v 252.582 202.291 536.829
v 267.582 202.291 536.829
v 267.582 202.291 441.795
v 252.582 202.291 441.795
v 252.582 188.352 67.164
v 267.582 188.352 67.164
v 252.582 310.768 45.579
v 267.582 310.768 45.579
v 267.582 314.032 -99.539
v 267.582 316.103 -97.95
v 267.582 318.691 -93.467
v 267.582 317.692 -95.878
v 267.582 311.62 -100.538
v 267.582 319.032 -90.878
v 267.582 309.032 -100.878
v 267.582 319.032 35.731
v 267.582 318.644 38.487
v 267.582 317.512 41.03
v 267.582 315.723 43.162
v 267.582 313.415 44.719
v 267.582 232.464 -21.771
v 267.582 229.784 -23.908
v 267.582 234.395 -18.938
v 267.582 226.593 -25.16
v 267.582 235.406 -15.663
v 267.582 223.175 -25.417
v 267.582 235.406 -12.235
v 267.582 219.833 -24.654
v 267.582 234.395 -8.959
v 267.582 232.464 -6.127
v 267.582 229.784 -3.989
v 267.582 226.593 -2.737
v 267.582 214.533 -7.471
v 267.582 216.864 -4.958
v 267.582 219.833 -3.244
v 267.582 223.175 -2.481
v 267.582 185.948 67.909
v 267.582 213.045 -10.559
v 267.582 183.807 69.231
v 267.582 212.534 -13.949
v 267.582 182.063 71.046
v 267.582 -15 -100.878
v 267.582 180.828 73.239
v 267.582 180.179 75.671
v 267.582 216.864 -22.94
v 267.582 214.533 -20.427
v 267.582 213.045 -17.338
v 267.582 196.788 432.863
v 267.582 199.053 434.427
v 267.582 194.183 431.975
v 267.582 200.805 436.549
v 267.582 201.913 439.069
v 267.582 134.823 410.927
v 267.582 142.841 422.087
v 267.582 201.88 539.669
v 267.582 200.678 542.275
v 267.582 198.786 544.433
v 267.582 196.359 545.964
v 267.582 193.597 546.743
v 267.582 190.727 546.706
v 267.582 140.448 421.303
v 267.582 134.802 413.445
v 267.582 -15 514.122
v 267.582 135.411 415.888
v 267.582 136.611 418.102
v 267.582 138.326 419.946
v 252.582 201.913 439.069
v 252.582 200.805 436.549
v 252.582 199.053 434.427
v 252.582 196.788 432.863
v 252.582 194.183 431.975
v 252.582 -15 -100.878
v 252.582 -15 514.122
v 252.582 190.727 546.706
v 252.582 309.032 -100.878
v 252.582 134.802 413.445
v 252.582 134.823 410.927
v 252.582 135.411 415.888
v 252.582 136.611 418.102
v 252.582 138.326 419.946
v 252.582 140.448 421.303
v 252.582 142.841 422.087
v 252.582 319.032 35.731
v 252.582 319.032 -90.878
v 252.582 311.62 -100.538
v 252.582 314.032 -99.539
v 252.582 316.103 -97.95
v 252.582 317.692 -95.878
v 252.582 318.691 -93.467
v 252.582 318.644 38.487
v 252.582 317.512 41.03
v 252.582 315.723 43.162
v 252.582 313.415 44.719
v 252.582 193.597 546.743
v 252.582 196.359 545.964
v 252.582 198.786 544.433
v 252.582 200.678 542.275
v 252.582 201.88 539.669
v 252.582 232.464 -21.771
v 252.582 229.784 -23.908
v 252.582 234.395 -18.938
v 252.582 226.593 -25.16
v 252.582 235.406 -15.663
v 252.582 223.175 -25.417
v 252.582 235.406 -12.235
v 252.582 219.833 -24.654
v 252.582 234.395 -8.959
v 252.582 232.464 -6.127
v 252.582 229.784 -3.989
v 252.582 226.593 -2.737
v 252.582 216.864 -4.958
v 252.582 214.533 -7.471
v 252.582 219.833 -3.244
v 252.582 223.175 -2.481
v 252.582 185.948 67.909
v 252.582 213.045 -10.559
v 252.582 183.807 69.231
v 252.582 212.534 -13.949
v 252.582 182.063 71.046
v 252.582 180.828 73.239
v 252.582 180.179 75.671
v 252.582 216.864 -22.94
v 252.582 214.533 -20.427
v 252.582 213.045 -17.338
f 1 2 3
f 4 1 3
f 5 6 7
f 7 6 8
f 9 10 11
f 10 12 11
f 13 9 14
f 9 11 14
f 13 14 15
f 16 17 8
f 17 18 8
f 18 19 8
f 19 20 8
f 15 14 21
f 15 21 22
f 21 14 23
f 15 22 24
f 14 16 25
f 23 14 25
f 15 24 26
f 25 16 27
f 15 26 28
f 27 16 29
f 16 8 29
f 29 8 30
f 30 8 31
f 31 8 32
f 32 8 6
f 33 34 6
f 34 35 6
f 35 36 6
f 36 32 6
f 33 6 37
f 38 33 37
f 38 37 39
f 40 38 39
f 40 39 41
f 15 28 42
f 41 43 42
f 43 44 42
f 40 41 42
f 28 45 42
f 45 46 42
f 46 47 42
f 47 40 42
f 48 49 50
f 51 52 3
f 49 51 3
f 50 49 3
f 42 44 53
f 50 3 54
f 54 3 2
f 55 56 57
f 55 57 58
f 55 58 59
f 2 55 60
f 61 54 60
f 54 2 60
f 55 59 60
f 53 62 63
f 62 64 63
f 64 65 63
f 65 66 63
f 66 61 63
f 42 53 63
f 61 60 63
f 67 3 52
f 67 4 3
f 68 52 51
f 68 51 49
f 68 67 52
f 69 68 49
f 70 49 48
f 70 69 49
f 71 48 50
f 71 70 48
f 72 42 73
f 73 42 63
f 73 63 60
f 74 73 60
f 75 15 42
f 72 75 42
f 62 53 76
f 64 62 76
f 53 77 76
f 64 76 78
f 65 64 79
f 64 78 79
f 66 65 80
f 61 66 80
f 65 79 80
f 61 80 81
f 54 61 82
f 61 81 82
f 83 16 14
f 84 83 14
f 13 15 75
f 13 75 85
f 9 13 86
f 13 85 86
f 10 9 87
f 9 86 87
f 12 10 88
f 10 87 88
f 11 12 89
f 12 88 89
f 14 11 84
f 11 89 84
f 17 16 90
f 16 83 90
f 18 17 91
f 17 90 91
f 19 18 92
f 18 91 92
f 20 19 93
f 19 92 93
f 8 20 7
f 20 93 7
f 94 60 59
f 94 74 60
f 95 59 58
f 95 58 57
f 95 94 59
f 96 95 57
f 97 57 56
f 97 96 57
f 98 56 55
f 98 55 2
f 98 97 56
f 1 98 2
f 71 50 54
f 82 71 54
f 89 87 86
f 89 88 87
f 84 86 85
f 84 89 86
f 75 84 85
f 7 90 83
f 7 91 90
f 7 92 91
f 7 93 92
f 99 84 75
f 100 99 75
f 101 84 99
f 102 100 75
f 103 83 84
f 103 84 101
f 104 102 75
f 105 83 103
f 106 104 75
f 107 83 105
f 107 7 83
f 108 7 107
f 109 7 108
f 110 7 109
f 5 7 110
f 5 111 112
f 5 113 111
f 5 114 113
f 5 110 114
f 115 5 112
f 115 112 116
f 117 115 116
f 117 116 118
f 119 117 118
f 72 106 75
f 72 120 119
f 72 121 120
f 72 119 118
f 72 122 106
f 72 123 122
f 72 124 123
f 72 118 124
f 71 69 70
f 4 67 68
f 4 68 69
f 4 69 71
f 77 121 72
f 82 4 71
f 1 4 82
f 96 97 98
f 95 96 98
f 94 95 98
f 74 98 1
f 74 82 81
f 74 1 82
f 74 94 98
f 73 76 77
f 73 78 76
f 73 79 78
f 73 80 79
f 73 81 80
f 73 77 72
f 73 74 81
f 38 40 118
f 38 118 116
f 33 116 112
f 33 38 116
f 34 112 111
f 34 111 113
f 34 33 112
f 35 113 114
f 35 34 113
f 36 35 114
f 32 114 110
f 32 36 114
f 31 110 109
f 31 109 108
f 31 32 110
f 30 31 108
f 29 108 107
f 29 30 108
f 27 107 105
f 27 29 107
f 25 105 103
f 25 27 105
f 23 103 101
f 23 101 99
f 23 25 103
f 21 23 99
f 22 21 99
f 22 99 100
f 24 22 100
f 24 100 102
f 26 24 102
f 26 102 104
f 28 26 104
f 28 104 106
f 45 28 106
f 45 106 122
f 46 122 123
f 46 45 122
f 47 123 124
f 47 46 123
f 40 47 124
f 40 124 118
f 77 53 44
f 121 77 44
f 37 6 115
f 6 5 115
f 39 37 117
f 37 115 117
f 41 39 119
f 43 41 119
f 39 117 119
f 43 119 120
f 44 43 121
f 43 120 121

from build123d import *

# Parameters (mm, degrees)
F0_R     = 11.5
F1_DEPTH = 15
F2_ANGLE = 90
F3_R     = 10


with BuildPart() as f1:
    # F0 (on Front) → F1 (new body)
    with BuildSketch(Plane.XZ):
        Polygon((-81.4494020062, -100.8784402028), (252.5822216817, -100.8784402028), (252.5822216817, 514.1215597972), (35.2907867508, 548.5371421061), (35.2907867508, 433.5371421061), (104.0274621586, 420.2982050686), (56.4236834155, 68.4323046706), (-81.4494020062, 44.1215597972), align=None)
        with Locations((13.5479746163, -13.94874061)):
            Circle(F0_R, mode=Mode.SUBTRACT)
    extrude(amount=F1_DEPTH)


with BuildPart() as f1_1:
    # F2: moved
    add(f1.part.rotate(Axis((252.5822216817, -15, 206.6215597972), (0, 0, -1)), F2_ANGLE))

    # F3
    f3_edges = [f1_1.edges().sort_by_distance(p)[0] for p in [
        (260.082222, 202.291435, 548.537142),
        (260.082222, 202.291435, 433.537142),
        (260.082222, 133.55476, 420.298205),
        (260.082222, 181.158538, 68.432305),
        (260.082222, 319.031624, 44.12156),
        (260.082222, 319.031624, -100.87844),
    ]]
    fillet(f3_edges, radius=F3_R)


solid = f1_1.part
